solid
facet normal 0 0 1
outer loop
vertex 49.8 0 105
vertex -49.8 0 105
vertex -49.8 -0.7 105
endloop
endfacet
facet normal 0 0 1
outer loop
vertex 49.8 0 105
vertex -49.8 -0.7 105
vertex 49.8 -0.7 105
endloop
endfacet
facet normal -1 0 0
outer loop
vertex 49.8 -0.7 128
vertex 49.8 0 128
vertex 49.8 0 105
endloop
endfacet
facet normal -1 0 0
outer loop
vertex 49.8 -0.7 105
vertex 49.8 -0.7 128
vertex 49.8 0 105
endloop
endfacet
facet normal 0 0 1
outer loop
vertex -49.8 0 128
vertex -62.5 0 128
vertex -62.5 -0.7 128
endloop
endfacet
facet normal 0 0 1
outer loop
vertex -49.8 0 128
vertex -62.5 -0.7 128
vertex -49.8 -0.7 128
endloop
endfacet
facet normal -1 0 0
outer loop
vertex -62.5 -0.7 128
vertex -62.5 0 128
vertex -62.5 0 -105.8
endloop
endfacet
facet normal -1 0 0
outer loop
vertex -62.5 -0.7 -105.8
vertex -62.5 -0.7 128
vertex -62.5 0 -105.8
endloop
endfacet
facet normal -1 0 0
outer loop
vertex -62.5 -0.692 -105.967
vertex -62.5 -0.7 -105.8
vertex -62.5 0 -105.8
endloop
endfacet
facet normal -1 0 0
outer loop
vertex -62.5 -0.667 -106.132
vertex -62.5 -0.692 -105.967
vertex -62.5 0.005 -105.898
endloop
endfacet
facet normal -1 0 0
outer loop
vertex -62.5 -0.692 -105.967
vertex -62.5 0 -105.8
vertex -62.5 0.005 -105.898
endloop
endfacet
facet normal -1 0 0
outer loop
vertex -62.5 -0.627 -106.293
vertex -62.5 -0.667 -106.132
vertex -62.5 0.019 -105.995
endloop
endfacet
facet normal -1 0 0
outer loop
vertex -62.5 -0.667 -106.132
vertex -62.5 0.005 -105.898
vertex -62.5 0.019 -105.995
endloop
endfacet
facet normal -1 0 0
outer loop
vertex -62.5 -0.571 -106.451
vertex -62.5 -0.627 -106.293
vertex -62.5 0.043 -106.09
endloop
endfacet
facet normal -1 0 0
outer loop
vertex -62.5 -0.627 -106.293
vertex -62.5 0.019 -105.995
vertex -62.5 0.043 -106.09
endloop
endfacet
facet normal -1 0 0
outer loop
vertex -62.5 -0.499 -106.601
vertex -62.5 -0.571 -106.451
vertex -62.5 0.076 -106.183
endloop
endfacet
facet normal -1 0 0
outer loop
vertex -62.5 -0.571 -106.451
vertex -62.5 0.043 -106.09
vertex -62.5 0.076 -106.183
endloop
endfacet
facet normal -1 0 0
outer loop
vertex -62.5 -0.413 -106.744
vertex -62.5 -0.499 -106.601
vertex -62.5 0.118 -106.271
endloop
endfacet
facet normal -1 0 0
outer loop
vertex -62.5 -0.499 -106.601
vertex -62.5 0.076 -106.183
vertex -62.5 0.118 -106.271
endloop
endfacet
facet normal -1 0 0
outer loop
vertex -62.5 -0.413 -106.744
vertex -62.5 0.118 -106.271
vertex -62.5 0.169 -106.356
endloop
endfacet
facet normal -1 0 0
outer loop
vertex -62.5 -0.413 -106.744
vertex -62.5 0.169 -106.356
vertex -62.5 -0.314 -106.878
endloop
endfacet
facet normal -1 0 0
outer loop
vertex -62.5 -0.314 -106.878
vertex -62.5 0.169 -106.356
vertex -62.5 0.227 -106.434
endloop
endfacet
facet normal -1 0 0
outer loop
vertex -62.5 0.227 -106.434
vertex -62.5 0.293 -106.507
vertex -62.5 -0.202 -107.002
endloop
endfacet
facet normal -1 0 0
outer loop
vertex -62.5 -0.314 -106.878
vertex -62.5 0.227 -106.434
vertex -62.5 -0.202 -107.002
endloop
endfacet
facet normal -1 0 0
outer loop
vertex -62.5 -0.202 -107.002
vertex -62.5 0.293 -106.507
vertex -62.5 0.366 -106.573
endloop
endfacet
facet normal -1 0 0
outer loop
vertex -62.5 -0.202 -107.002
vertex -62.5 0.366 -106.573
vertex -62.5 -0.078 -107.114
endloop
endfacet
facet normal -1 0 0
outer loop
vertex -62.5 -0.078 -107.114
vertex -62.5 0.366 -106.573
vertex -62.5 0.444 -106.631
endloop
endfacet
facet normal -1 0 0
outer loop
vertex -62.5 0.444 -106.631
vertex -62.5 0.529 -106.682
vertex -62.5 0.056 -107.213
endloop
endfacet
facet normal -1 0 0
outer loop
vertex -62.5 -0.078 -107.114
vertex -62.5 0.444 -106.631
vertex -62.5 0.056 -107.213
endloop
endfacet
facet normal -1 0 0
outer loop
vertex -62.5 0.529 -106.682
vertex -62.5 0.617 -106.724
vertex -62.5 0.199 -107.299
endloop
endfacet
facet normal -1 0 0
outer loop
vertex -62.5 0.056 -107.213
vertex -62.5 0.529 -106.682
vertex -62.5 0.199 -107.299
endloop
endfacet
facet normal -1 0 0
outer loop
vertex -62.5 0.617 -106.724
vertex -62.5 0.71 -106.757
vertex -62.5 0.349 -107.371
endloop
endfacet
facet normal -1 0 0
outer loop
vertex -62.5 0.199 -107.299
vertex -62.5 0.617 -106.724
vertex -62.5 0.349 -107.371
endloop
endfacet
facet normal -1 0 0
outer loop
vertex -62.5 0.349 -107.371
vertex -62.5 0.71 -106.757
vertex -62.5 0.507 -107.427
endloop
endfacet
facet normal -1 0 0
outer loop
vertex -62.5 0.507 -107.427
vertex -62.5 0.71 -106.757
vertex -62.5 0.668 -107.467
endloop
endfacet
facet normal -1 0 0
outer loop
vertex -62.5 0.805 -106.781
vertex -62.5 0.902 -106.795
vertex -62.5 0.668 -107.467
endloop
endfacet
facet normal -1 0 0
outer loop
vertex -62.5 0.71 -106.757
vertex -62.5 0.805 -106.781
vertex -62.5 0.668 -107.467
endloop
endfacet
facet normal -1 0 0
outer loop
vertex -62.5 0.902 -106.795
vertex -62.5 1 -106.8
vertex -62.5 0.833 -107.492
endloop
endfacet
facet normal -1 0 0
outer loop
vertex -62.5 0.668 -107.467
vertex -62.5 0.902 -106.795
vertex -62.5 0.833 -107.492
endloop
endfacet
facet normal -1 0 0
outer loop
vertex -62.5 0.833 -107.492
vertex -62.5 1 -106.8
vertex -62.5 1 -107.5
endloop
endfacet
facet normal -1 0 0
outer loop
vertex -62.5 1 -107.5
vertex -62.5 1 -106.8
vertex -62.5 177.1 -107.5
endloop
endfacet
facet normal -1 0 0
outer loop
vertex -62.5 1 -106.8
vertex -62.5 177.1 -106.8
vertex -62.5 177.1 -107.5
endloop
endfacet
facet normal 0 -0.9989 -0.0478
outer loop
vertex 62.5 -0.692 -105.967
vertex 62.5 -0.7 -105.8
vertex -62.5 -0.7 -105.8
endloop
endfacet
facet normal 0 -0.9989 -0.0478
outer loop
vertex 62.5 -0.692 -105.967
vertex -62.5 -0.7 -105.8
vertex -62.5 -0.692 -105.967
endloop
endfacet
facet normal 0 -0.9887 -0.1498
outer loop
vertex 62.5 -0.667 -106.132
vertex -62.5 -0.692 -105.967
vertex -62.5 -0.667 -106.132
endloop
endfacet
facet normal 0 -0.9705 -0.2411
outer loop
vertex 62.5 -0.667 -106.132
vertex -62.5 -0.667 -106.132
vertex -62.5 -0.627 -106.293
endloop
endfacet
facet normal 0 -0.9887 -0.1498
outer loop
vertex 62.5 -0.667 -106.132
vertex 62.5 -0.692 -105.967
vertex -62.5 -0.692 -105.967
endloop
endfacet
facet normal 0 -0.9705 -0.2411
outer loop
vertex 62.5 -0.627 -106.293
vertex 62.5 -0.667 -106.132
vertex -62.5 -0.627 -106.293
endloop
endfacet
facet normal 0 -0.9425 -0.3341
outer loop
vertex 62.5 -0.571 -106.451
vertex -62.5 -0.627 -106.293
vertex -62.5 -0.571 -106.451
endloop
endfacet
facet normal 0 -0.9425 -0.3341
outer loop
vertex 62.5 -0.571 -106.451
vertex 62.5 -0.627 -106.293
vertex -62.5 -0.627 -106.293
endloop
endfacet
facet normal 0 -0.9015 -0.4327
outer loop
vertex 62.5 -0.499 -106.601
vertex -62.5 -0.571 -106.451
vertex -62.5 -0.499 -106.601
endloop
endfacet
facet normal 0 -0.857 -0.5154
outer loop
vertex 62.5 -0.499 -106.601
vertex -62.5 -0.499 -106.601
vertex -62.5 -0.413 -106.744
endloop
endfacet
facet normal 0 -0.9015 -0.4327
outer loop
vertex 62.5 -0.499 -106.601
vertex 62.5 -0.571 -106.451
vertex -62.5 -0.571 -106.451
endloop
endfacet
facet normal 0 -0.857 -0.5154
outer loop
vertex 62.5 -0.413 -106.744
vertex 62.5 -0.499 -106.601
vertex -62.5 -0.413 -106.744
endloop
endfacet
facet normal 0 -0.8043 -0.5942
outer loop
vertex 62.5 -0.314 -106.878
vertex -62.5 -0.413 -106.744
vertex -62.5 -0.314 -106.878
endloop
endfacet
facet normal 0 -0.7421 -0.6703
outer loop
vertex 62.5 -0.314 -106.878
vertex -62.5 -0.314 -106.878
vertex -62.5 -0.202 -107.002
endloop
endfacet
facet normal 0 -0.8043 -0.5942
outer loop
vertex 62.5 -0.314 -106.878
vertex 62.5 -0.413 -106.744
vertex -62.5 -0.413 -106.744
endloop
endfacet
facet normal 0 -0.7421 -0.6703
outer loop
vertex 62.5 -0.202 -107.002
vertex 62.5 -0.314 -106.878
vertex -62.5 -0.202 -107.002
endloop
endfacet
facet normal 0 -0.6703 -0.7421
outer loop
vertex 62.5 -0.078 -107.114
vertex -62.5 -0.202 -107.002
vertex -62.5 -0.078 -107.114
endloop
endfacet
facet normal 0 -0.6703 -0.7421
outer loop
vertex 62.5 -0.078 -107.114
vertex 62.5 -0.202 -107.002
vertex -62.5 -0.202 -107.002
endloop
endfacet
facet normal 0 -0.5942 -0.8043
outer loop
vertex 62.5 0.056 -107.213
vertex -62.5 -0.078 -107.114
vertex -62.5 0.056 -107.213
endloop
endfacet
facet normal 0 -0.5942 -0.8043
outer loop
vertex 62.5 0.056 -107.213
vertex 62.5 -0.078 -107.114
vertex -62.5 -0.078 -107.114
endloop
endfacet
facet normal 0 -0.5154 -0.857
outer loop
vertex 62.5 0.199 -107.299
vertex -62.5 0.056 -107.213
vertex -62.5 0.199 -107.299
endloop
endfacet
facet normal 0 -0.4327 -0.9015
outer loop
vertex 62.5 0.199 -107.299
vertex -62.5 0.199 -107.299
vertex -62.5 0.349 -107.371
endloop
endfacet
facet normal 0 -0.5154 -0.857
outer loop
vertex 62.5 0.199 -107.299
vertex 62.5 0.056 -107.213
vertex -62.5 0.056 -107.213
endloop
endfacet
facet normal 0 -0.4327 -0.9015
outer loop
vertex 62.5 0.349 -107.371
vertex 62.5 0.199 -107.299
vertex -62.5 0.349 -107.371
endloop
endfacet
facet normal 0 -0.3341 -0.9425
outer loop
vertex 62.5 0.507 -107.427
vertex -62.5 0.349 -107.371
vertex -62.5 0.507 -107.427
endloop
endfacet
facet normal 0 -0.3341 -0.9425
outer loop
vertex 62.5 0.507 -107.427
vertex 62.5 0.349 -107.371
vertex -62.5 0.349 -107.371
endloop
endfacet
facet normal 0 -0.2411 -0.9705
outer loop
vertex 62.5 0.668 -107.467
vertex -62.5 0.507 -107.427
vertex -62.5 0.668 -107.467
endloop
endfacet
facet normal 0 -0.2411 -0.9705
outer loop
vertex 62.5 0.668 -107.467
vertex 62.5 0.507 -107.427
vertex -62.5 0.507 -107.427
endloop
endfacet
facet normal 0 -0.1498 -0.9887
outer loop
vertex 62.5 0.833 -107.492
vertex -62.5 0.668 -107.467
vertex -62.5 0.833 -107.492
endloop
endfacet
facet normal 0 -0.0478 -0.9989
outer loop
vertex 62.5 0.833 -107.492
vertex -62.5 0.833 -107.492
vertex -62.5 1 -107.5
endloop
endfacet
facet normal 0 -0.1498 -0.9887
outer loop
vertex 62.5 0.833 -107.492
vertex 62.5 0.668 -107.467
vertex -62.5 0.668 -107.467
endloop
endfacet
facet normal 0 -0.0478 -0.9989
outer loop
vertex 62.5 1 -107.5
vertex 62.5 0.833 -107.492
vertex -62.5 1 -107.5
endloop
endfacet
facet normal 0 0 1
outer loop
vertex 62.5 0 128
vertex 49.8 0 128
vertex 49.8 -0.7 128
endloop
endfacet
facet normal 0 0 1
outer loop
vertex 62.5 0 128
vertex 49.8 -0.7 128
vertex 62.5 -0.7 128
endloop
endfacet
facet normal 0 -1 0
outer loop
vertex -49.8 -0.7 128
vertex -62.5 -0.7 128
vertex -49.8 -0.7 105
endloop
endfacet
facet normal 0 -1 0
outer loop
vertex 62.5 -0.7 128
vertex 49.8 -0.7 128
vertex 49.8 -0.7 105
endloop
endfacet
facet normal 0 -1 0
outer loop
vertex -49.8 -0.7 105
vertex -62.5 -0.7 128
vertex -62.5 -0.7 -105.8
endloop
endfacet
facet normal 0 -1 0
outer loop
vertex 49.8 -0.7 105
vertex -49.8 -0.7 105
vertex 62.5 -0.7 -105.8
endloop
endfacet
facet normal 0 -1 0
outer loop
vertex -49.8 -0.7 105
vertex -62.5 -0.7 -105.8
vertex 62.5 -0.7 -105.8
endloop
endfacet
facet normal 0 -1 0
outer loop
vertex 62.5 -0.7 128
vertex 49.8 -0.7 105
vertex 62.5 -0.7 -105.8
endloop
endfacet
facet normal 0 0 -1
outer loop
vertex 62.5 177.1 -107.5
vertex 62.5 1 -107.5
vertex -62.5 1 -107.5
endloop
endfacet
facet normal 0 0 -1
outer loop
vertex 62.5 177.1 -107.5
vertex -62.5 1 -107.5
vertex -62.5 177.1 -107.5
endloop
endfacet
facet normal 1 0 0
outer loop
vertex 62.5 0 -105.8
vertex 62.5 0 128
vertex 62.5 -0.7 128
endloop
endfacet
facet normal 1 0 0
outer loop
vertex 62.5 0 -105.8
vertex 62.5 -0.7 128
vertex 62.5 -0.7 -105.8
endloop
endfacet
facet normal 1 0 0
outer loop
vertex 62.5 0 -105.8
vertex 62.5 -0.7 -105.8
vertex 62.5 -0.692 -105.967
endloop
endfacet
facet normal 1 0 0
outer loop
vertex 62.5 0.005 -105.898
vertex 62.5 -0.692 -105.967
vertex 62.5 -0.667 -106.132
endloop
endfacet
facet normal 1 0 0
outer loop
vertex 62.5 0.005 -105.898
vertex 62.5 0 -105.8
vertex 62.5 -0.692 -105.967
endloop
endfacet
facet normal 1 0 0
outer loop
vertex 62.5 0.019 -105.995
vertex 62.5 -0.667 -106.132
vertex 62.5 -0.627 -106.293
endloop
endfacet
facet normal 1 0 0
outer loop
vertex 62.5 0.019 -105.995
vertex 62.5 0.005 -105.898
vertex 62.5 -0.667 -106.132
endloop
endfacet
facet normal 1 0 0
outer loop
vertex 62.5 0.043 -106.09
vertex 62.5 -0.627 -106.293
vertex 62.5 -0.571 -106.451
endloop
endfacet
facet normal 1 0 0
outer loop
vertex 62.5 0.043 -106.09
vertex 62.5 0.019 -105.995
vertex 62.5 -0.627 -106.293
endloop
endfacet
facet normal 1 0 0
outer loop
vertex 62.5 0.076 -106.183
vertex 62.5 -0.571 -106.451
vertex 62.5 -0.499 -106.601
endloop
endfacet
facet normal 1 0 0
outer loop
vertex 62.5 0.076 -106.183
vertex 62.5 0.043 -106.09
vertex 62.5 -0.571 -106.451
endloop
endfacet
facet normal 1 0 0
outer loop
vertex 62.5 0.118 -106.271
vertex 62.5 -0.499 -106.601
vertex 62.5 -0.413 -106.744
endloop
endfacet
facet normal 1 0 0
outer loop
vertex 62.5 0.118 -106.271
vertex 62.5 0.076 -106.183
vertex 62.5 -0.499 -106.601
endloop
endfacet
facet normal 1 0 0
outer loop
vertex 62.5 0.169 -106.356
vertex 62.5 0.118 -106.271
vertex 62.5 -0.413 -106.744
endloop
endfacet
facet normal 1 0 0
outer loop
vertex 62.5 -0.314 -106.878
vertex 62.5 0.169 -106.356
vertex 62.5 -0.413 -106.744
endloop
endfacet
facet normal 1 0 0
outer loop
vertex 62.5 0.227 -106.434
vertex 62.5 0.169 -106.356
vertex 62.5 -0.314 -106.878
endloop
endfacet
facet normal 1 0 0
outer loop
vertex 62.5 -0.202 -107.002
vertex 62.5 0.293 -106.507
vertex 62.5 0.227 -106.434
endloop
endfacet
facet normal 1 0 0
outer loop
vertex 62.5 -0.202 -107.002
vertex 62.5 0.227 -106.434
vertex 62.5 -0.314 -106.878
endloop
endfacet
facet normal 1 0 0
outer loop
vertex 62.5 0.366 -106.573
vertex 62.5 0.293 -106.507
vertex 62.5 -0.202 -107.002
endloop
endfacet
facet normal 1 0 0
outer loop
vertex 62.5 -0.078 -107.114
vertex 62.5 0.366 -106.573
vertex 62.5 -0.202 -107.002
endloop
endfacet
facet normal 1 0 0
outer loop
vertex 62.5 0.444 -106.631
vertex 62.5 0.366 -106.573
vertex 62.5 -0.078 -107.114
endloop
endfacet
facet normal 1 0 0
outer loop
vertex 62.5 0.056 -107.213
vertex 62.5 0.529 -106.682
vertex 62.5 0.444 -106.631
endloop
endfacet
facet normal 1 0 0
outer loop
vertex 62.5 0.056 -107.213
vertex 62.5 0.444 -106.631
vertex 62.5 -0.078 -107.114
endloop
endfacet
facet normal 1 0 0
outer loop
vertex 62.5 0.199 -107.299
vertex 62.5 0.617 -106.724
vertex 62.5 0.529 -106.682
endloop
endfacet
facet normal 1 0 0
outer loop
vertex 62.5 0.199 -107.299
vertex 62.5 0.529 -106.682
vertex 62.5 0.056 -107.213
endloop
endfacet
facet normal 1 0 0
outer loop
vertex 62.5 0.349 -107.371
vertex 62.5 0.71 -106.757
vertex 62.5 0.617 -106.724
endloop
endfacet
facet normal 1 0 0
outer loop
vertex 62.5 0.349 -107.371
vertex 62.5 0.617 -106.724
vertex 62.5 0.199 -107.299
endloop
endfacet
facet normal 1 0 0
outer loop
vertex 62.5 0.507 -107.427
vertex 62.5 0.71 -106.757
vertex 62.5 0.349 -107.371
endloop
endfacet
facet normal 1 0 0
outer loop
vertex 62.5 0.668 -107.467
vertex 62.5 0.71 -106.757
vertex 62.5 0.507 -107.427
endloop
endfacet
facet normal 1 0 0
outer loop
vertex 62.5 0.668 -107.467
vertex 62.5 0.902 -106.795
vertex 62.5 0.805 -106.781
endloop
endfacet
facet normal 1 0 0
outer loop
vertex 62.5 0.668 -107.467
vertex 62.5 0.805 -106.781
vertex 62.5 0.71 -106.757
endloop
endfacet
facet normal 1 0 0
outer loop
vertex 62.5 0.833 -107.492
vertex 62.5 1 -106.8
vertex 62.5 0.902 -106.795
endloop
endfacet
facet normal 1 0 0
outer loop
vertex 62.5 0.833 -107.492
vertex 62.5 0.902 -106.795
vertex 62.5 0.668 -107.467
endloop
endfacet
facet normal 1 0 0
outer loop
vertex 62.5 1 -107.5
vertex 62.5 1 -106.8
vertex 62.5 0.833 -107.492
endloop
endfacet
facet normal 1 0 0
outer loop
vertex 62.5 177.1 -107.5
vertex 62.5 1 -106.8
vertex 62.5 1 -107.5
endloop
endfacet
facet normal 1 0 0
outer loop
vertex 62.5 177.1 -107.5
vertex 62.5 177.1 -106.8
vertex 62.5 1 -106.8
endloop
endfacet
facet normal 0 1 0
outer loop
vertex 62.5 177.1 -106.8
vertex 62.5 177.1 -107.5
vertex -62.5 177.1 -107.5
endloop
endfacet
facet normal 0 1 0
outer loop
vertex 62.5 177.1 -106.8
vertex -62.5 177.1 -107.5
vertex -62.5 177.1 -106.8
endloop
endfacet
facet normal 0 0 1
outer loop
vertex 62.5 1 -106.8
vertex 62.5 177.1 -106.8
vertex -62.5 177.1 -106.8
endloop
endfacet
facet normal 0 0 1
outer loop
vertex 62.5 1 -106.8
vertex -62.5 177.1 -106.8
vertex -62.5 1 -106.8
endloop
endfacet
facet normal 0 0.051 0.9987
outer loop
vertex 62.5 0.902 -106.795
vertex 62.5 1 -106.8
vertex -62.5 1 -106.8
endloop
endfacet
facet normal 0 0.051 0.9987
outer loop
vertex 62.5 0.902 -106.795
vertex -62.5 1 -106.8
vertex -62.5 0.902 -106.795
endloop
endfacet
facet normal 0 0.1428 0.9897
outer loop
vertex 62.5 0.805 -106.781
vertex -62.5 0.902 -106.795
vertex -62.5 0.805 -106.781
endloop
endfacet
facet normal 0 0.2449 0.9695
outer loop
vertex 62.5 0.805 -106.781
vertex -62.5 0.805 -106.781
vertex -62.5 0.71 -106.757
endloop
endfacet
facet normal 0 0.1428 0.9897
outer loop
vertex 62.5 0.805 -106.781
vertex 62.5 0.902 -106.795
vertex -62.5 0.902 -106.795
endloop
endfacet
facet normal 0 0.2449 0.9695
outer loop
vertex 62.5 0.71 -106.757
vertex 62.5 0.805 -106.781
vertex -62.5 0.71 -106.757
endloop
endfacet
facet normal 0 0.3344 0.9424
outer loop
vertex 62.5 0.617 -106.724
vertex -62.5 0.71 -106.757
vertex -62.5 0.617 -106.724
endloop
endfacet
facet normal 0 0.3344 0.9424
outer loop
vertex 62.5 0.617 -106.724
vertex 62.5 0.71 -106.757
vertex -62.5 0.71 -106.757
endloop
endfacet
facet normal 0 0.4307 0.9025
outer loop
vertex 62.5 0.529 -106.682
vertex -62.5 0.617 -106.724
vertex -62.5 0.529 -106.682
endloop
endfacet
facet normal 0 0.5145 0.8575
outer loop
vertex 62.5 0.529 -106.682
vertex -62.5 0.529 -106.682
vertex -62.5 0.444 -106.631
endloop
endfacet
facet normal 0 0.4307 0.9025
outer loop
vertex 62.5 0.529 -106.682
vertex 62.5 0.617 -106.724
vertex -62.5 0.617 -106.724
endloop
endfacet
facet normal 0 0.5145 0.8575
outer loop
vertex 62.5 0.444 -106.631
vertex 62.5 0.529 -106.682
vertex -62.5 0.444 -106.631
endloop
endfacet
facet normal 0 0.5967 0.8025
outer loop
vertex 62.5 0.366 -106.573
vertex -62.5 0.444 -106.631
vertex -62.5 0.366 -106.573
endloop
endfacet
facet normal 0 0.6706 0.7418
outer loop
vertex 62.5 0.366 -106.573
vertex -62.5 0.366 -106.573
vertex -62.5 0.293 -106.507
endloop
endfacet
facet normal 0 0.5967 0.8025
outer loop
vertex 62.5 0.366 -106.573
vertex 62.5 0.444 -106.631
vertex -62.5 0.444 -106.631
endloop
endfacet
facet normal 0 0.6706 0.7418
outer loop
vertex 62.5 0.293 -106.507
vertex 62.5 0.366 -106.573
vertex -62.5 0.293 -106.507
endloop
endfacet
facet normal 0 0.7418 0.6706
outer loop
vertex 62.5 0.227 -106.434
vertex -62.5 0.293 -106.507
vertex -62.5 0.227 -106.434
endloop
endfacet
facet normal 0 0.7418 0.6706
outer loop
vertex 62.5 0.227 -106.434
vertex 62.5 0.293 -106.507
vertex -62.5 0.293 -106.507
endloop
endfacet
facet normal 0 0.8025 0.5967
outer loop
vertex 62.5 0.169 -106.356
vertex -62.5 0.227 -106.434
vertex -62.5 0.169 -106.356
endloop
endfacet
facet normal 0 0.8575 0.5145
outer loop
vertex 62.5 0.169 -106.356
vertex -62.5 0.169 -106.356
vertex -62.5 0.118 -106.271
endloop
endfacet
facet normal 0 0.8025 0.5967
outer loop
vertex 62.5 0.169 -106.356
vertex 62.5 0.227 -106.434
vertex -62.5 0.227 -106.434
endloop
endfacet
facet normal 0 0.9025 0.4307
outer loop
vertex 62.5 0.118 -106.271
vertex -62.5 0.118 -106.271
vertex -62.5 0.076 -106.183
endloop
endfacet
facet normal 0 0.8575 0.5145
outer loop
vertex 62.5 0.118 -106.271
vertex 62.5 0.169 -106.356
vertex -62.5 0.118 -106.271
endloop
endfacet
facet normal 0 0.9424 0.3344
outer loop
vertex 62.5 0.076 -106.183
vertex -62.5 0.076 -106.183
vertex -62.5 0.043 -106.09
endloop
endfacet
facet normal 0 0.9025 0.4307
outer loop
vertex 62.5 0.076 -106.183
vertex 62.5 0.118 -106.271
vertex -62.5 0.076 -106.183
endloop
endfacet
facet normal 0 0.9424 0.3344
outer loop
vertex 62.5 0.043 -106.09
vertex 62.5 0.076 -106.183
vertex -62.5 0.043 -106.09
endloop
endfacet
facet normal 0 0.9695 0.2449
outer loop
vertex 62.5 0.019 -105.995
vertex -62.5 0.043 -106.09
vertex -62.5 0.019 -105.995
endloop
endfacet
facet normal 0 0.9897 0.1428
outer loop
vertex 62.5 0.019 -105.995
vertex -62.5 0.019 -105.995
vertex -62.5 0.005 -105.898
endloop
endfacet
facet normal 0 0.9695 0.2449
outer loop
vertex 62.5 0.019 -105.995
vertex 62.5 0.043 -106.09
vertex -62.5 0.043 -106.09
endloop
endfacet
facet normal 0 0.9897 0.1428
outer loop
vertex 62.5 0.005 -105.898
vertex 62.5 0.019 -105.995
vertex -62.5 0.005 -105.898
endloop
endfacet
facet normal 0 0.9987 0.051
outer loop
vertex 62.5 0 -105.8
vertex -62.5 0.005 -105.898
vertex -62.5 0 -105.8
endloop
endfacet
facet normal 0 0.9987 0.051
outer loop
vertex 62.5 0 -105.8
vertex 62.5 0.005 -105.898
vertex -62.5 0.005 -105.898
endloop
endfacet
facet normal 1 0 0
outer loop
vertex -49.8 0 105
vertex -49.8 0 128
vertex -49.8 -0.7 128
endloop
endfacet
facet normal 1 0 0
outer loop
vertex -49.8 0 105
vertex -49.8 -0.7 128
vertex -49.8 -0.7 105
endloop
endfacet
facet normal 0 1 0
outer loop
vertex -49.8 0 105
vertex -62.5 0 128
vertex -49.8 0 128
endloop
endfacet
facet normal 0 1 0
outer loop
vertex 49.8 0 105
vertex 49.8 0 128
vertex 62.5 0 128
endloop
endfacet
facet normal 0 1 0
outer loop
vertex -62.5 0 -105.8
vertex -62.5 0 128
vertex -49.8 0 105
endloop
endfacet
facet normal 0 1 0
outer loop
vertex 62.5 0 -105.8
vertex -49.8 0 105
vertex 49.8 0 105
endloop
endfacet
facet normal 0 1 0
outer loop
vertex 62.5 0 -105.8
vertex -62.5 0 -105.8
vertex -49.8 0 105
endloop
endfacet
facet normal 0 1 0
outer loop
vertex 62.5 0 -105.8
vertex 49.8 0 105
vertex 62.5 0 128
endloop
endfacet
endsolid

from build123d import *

# Parameters (mm, degrees)
SKETCH1_W          = 125
SKETCH1_H          = 210
BASE_FLANGE1_DEPTH = 0.7
EDGE_FLANGE1_DEPTH = 125
SKETCH9_W          = 12.7
SKETCH9_H          = 23
TAB1_DEPTH         = 0.7
SKETCH12_W         = 12.7
SKETCH12_H         = 23
TAB2_DEPTH         = 0.7


# Sheet-metal steps are written as plain solids
with BuildPart() as part:
    # Sketch1 → Base-Flange1 (new body)
    with BuildSketch(Plane(origin=(0, 0, 0), x_dir=(1, 0, 0), z_dir=(0, 1, 0))):
        Rectangle(SKETCH1_W, SKETCH1_H)
    extrude(amount=-BASE_FLANGE1_DEPTH)

    # Edge-Flange1 section (across the edge) → Edge-Flange1 (add)
    with BuildSketch(Plane(origin=(62.5, 0, -106.8), x_dir=(0, 0, 1), z_dir=(-1, 0, 0))):
        with BuildLine():
            Line((-0.7, 1), (-0.7, 177.1))
            Line((-0.7, 177.1), (0, 177.1))
            Line((0, 177.1), (0, 1))
            ThreePointArc((0, 1), (0.292893219, 0.292893219), (1, 0))
            Line((1, 0), (1.8, 0))
            Line((1.8, 0), (1.8, -0.7))
            Line((1.8, -0.7), (1, -0.7))
            ThreePointArc((1, -0.7), (-0.202081528, -0.202081528), (-0.7, 1))
        make_face()
    extrude(amount=EDGE_FLANGE1_DEPTH)

    # Sketch9 → Tab1 (add)
    with BuildSketch(Plane(origin=(0, 0, 0), x_dir=(1, 0, 0), z_dir=(0, 1, 0))):
        with Locations((-56.15, -116.5)):
            Rectangle(SKETCH9_W, SKETCH9_H)
    extrude(amount=-TAB1_DEPTH)

    # Sketch12 → Tab2 (add)
    with BuildSketch(Plane(origin=(0, 0, 0), x_dir=(1, 0, 0), z_dir=(0, 1, 0))):
        with Locations((56.15, -116.5)):
            Rectangle(SKETCH12_W, SKETCH12_H)
    extrude(amount=-TAB2_DEPTH)


solid = part.part
